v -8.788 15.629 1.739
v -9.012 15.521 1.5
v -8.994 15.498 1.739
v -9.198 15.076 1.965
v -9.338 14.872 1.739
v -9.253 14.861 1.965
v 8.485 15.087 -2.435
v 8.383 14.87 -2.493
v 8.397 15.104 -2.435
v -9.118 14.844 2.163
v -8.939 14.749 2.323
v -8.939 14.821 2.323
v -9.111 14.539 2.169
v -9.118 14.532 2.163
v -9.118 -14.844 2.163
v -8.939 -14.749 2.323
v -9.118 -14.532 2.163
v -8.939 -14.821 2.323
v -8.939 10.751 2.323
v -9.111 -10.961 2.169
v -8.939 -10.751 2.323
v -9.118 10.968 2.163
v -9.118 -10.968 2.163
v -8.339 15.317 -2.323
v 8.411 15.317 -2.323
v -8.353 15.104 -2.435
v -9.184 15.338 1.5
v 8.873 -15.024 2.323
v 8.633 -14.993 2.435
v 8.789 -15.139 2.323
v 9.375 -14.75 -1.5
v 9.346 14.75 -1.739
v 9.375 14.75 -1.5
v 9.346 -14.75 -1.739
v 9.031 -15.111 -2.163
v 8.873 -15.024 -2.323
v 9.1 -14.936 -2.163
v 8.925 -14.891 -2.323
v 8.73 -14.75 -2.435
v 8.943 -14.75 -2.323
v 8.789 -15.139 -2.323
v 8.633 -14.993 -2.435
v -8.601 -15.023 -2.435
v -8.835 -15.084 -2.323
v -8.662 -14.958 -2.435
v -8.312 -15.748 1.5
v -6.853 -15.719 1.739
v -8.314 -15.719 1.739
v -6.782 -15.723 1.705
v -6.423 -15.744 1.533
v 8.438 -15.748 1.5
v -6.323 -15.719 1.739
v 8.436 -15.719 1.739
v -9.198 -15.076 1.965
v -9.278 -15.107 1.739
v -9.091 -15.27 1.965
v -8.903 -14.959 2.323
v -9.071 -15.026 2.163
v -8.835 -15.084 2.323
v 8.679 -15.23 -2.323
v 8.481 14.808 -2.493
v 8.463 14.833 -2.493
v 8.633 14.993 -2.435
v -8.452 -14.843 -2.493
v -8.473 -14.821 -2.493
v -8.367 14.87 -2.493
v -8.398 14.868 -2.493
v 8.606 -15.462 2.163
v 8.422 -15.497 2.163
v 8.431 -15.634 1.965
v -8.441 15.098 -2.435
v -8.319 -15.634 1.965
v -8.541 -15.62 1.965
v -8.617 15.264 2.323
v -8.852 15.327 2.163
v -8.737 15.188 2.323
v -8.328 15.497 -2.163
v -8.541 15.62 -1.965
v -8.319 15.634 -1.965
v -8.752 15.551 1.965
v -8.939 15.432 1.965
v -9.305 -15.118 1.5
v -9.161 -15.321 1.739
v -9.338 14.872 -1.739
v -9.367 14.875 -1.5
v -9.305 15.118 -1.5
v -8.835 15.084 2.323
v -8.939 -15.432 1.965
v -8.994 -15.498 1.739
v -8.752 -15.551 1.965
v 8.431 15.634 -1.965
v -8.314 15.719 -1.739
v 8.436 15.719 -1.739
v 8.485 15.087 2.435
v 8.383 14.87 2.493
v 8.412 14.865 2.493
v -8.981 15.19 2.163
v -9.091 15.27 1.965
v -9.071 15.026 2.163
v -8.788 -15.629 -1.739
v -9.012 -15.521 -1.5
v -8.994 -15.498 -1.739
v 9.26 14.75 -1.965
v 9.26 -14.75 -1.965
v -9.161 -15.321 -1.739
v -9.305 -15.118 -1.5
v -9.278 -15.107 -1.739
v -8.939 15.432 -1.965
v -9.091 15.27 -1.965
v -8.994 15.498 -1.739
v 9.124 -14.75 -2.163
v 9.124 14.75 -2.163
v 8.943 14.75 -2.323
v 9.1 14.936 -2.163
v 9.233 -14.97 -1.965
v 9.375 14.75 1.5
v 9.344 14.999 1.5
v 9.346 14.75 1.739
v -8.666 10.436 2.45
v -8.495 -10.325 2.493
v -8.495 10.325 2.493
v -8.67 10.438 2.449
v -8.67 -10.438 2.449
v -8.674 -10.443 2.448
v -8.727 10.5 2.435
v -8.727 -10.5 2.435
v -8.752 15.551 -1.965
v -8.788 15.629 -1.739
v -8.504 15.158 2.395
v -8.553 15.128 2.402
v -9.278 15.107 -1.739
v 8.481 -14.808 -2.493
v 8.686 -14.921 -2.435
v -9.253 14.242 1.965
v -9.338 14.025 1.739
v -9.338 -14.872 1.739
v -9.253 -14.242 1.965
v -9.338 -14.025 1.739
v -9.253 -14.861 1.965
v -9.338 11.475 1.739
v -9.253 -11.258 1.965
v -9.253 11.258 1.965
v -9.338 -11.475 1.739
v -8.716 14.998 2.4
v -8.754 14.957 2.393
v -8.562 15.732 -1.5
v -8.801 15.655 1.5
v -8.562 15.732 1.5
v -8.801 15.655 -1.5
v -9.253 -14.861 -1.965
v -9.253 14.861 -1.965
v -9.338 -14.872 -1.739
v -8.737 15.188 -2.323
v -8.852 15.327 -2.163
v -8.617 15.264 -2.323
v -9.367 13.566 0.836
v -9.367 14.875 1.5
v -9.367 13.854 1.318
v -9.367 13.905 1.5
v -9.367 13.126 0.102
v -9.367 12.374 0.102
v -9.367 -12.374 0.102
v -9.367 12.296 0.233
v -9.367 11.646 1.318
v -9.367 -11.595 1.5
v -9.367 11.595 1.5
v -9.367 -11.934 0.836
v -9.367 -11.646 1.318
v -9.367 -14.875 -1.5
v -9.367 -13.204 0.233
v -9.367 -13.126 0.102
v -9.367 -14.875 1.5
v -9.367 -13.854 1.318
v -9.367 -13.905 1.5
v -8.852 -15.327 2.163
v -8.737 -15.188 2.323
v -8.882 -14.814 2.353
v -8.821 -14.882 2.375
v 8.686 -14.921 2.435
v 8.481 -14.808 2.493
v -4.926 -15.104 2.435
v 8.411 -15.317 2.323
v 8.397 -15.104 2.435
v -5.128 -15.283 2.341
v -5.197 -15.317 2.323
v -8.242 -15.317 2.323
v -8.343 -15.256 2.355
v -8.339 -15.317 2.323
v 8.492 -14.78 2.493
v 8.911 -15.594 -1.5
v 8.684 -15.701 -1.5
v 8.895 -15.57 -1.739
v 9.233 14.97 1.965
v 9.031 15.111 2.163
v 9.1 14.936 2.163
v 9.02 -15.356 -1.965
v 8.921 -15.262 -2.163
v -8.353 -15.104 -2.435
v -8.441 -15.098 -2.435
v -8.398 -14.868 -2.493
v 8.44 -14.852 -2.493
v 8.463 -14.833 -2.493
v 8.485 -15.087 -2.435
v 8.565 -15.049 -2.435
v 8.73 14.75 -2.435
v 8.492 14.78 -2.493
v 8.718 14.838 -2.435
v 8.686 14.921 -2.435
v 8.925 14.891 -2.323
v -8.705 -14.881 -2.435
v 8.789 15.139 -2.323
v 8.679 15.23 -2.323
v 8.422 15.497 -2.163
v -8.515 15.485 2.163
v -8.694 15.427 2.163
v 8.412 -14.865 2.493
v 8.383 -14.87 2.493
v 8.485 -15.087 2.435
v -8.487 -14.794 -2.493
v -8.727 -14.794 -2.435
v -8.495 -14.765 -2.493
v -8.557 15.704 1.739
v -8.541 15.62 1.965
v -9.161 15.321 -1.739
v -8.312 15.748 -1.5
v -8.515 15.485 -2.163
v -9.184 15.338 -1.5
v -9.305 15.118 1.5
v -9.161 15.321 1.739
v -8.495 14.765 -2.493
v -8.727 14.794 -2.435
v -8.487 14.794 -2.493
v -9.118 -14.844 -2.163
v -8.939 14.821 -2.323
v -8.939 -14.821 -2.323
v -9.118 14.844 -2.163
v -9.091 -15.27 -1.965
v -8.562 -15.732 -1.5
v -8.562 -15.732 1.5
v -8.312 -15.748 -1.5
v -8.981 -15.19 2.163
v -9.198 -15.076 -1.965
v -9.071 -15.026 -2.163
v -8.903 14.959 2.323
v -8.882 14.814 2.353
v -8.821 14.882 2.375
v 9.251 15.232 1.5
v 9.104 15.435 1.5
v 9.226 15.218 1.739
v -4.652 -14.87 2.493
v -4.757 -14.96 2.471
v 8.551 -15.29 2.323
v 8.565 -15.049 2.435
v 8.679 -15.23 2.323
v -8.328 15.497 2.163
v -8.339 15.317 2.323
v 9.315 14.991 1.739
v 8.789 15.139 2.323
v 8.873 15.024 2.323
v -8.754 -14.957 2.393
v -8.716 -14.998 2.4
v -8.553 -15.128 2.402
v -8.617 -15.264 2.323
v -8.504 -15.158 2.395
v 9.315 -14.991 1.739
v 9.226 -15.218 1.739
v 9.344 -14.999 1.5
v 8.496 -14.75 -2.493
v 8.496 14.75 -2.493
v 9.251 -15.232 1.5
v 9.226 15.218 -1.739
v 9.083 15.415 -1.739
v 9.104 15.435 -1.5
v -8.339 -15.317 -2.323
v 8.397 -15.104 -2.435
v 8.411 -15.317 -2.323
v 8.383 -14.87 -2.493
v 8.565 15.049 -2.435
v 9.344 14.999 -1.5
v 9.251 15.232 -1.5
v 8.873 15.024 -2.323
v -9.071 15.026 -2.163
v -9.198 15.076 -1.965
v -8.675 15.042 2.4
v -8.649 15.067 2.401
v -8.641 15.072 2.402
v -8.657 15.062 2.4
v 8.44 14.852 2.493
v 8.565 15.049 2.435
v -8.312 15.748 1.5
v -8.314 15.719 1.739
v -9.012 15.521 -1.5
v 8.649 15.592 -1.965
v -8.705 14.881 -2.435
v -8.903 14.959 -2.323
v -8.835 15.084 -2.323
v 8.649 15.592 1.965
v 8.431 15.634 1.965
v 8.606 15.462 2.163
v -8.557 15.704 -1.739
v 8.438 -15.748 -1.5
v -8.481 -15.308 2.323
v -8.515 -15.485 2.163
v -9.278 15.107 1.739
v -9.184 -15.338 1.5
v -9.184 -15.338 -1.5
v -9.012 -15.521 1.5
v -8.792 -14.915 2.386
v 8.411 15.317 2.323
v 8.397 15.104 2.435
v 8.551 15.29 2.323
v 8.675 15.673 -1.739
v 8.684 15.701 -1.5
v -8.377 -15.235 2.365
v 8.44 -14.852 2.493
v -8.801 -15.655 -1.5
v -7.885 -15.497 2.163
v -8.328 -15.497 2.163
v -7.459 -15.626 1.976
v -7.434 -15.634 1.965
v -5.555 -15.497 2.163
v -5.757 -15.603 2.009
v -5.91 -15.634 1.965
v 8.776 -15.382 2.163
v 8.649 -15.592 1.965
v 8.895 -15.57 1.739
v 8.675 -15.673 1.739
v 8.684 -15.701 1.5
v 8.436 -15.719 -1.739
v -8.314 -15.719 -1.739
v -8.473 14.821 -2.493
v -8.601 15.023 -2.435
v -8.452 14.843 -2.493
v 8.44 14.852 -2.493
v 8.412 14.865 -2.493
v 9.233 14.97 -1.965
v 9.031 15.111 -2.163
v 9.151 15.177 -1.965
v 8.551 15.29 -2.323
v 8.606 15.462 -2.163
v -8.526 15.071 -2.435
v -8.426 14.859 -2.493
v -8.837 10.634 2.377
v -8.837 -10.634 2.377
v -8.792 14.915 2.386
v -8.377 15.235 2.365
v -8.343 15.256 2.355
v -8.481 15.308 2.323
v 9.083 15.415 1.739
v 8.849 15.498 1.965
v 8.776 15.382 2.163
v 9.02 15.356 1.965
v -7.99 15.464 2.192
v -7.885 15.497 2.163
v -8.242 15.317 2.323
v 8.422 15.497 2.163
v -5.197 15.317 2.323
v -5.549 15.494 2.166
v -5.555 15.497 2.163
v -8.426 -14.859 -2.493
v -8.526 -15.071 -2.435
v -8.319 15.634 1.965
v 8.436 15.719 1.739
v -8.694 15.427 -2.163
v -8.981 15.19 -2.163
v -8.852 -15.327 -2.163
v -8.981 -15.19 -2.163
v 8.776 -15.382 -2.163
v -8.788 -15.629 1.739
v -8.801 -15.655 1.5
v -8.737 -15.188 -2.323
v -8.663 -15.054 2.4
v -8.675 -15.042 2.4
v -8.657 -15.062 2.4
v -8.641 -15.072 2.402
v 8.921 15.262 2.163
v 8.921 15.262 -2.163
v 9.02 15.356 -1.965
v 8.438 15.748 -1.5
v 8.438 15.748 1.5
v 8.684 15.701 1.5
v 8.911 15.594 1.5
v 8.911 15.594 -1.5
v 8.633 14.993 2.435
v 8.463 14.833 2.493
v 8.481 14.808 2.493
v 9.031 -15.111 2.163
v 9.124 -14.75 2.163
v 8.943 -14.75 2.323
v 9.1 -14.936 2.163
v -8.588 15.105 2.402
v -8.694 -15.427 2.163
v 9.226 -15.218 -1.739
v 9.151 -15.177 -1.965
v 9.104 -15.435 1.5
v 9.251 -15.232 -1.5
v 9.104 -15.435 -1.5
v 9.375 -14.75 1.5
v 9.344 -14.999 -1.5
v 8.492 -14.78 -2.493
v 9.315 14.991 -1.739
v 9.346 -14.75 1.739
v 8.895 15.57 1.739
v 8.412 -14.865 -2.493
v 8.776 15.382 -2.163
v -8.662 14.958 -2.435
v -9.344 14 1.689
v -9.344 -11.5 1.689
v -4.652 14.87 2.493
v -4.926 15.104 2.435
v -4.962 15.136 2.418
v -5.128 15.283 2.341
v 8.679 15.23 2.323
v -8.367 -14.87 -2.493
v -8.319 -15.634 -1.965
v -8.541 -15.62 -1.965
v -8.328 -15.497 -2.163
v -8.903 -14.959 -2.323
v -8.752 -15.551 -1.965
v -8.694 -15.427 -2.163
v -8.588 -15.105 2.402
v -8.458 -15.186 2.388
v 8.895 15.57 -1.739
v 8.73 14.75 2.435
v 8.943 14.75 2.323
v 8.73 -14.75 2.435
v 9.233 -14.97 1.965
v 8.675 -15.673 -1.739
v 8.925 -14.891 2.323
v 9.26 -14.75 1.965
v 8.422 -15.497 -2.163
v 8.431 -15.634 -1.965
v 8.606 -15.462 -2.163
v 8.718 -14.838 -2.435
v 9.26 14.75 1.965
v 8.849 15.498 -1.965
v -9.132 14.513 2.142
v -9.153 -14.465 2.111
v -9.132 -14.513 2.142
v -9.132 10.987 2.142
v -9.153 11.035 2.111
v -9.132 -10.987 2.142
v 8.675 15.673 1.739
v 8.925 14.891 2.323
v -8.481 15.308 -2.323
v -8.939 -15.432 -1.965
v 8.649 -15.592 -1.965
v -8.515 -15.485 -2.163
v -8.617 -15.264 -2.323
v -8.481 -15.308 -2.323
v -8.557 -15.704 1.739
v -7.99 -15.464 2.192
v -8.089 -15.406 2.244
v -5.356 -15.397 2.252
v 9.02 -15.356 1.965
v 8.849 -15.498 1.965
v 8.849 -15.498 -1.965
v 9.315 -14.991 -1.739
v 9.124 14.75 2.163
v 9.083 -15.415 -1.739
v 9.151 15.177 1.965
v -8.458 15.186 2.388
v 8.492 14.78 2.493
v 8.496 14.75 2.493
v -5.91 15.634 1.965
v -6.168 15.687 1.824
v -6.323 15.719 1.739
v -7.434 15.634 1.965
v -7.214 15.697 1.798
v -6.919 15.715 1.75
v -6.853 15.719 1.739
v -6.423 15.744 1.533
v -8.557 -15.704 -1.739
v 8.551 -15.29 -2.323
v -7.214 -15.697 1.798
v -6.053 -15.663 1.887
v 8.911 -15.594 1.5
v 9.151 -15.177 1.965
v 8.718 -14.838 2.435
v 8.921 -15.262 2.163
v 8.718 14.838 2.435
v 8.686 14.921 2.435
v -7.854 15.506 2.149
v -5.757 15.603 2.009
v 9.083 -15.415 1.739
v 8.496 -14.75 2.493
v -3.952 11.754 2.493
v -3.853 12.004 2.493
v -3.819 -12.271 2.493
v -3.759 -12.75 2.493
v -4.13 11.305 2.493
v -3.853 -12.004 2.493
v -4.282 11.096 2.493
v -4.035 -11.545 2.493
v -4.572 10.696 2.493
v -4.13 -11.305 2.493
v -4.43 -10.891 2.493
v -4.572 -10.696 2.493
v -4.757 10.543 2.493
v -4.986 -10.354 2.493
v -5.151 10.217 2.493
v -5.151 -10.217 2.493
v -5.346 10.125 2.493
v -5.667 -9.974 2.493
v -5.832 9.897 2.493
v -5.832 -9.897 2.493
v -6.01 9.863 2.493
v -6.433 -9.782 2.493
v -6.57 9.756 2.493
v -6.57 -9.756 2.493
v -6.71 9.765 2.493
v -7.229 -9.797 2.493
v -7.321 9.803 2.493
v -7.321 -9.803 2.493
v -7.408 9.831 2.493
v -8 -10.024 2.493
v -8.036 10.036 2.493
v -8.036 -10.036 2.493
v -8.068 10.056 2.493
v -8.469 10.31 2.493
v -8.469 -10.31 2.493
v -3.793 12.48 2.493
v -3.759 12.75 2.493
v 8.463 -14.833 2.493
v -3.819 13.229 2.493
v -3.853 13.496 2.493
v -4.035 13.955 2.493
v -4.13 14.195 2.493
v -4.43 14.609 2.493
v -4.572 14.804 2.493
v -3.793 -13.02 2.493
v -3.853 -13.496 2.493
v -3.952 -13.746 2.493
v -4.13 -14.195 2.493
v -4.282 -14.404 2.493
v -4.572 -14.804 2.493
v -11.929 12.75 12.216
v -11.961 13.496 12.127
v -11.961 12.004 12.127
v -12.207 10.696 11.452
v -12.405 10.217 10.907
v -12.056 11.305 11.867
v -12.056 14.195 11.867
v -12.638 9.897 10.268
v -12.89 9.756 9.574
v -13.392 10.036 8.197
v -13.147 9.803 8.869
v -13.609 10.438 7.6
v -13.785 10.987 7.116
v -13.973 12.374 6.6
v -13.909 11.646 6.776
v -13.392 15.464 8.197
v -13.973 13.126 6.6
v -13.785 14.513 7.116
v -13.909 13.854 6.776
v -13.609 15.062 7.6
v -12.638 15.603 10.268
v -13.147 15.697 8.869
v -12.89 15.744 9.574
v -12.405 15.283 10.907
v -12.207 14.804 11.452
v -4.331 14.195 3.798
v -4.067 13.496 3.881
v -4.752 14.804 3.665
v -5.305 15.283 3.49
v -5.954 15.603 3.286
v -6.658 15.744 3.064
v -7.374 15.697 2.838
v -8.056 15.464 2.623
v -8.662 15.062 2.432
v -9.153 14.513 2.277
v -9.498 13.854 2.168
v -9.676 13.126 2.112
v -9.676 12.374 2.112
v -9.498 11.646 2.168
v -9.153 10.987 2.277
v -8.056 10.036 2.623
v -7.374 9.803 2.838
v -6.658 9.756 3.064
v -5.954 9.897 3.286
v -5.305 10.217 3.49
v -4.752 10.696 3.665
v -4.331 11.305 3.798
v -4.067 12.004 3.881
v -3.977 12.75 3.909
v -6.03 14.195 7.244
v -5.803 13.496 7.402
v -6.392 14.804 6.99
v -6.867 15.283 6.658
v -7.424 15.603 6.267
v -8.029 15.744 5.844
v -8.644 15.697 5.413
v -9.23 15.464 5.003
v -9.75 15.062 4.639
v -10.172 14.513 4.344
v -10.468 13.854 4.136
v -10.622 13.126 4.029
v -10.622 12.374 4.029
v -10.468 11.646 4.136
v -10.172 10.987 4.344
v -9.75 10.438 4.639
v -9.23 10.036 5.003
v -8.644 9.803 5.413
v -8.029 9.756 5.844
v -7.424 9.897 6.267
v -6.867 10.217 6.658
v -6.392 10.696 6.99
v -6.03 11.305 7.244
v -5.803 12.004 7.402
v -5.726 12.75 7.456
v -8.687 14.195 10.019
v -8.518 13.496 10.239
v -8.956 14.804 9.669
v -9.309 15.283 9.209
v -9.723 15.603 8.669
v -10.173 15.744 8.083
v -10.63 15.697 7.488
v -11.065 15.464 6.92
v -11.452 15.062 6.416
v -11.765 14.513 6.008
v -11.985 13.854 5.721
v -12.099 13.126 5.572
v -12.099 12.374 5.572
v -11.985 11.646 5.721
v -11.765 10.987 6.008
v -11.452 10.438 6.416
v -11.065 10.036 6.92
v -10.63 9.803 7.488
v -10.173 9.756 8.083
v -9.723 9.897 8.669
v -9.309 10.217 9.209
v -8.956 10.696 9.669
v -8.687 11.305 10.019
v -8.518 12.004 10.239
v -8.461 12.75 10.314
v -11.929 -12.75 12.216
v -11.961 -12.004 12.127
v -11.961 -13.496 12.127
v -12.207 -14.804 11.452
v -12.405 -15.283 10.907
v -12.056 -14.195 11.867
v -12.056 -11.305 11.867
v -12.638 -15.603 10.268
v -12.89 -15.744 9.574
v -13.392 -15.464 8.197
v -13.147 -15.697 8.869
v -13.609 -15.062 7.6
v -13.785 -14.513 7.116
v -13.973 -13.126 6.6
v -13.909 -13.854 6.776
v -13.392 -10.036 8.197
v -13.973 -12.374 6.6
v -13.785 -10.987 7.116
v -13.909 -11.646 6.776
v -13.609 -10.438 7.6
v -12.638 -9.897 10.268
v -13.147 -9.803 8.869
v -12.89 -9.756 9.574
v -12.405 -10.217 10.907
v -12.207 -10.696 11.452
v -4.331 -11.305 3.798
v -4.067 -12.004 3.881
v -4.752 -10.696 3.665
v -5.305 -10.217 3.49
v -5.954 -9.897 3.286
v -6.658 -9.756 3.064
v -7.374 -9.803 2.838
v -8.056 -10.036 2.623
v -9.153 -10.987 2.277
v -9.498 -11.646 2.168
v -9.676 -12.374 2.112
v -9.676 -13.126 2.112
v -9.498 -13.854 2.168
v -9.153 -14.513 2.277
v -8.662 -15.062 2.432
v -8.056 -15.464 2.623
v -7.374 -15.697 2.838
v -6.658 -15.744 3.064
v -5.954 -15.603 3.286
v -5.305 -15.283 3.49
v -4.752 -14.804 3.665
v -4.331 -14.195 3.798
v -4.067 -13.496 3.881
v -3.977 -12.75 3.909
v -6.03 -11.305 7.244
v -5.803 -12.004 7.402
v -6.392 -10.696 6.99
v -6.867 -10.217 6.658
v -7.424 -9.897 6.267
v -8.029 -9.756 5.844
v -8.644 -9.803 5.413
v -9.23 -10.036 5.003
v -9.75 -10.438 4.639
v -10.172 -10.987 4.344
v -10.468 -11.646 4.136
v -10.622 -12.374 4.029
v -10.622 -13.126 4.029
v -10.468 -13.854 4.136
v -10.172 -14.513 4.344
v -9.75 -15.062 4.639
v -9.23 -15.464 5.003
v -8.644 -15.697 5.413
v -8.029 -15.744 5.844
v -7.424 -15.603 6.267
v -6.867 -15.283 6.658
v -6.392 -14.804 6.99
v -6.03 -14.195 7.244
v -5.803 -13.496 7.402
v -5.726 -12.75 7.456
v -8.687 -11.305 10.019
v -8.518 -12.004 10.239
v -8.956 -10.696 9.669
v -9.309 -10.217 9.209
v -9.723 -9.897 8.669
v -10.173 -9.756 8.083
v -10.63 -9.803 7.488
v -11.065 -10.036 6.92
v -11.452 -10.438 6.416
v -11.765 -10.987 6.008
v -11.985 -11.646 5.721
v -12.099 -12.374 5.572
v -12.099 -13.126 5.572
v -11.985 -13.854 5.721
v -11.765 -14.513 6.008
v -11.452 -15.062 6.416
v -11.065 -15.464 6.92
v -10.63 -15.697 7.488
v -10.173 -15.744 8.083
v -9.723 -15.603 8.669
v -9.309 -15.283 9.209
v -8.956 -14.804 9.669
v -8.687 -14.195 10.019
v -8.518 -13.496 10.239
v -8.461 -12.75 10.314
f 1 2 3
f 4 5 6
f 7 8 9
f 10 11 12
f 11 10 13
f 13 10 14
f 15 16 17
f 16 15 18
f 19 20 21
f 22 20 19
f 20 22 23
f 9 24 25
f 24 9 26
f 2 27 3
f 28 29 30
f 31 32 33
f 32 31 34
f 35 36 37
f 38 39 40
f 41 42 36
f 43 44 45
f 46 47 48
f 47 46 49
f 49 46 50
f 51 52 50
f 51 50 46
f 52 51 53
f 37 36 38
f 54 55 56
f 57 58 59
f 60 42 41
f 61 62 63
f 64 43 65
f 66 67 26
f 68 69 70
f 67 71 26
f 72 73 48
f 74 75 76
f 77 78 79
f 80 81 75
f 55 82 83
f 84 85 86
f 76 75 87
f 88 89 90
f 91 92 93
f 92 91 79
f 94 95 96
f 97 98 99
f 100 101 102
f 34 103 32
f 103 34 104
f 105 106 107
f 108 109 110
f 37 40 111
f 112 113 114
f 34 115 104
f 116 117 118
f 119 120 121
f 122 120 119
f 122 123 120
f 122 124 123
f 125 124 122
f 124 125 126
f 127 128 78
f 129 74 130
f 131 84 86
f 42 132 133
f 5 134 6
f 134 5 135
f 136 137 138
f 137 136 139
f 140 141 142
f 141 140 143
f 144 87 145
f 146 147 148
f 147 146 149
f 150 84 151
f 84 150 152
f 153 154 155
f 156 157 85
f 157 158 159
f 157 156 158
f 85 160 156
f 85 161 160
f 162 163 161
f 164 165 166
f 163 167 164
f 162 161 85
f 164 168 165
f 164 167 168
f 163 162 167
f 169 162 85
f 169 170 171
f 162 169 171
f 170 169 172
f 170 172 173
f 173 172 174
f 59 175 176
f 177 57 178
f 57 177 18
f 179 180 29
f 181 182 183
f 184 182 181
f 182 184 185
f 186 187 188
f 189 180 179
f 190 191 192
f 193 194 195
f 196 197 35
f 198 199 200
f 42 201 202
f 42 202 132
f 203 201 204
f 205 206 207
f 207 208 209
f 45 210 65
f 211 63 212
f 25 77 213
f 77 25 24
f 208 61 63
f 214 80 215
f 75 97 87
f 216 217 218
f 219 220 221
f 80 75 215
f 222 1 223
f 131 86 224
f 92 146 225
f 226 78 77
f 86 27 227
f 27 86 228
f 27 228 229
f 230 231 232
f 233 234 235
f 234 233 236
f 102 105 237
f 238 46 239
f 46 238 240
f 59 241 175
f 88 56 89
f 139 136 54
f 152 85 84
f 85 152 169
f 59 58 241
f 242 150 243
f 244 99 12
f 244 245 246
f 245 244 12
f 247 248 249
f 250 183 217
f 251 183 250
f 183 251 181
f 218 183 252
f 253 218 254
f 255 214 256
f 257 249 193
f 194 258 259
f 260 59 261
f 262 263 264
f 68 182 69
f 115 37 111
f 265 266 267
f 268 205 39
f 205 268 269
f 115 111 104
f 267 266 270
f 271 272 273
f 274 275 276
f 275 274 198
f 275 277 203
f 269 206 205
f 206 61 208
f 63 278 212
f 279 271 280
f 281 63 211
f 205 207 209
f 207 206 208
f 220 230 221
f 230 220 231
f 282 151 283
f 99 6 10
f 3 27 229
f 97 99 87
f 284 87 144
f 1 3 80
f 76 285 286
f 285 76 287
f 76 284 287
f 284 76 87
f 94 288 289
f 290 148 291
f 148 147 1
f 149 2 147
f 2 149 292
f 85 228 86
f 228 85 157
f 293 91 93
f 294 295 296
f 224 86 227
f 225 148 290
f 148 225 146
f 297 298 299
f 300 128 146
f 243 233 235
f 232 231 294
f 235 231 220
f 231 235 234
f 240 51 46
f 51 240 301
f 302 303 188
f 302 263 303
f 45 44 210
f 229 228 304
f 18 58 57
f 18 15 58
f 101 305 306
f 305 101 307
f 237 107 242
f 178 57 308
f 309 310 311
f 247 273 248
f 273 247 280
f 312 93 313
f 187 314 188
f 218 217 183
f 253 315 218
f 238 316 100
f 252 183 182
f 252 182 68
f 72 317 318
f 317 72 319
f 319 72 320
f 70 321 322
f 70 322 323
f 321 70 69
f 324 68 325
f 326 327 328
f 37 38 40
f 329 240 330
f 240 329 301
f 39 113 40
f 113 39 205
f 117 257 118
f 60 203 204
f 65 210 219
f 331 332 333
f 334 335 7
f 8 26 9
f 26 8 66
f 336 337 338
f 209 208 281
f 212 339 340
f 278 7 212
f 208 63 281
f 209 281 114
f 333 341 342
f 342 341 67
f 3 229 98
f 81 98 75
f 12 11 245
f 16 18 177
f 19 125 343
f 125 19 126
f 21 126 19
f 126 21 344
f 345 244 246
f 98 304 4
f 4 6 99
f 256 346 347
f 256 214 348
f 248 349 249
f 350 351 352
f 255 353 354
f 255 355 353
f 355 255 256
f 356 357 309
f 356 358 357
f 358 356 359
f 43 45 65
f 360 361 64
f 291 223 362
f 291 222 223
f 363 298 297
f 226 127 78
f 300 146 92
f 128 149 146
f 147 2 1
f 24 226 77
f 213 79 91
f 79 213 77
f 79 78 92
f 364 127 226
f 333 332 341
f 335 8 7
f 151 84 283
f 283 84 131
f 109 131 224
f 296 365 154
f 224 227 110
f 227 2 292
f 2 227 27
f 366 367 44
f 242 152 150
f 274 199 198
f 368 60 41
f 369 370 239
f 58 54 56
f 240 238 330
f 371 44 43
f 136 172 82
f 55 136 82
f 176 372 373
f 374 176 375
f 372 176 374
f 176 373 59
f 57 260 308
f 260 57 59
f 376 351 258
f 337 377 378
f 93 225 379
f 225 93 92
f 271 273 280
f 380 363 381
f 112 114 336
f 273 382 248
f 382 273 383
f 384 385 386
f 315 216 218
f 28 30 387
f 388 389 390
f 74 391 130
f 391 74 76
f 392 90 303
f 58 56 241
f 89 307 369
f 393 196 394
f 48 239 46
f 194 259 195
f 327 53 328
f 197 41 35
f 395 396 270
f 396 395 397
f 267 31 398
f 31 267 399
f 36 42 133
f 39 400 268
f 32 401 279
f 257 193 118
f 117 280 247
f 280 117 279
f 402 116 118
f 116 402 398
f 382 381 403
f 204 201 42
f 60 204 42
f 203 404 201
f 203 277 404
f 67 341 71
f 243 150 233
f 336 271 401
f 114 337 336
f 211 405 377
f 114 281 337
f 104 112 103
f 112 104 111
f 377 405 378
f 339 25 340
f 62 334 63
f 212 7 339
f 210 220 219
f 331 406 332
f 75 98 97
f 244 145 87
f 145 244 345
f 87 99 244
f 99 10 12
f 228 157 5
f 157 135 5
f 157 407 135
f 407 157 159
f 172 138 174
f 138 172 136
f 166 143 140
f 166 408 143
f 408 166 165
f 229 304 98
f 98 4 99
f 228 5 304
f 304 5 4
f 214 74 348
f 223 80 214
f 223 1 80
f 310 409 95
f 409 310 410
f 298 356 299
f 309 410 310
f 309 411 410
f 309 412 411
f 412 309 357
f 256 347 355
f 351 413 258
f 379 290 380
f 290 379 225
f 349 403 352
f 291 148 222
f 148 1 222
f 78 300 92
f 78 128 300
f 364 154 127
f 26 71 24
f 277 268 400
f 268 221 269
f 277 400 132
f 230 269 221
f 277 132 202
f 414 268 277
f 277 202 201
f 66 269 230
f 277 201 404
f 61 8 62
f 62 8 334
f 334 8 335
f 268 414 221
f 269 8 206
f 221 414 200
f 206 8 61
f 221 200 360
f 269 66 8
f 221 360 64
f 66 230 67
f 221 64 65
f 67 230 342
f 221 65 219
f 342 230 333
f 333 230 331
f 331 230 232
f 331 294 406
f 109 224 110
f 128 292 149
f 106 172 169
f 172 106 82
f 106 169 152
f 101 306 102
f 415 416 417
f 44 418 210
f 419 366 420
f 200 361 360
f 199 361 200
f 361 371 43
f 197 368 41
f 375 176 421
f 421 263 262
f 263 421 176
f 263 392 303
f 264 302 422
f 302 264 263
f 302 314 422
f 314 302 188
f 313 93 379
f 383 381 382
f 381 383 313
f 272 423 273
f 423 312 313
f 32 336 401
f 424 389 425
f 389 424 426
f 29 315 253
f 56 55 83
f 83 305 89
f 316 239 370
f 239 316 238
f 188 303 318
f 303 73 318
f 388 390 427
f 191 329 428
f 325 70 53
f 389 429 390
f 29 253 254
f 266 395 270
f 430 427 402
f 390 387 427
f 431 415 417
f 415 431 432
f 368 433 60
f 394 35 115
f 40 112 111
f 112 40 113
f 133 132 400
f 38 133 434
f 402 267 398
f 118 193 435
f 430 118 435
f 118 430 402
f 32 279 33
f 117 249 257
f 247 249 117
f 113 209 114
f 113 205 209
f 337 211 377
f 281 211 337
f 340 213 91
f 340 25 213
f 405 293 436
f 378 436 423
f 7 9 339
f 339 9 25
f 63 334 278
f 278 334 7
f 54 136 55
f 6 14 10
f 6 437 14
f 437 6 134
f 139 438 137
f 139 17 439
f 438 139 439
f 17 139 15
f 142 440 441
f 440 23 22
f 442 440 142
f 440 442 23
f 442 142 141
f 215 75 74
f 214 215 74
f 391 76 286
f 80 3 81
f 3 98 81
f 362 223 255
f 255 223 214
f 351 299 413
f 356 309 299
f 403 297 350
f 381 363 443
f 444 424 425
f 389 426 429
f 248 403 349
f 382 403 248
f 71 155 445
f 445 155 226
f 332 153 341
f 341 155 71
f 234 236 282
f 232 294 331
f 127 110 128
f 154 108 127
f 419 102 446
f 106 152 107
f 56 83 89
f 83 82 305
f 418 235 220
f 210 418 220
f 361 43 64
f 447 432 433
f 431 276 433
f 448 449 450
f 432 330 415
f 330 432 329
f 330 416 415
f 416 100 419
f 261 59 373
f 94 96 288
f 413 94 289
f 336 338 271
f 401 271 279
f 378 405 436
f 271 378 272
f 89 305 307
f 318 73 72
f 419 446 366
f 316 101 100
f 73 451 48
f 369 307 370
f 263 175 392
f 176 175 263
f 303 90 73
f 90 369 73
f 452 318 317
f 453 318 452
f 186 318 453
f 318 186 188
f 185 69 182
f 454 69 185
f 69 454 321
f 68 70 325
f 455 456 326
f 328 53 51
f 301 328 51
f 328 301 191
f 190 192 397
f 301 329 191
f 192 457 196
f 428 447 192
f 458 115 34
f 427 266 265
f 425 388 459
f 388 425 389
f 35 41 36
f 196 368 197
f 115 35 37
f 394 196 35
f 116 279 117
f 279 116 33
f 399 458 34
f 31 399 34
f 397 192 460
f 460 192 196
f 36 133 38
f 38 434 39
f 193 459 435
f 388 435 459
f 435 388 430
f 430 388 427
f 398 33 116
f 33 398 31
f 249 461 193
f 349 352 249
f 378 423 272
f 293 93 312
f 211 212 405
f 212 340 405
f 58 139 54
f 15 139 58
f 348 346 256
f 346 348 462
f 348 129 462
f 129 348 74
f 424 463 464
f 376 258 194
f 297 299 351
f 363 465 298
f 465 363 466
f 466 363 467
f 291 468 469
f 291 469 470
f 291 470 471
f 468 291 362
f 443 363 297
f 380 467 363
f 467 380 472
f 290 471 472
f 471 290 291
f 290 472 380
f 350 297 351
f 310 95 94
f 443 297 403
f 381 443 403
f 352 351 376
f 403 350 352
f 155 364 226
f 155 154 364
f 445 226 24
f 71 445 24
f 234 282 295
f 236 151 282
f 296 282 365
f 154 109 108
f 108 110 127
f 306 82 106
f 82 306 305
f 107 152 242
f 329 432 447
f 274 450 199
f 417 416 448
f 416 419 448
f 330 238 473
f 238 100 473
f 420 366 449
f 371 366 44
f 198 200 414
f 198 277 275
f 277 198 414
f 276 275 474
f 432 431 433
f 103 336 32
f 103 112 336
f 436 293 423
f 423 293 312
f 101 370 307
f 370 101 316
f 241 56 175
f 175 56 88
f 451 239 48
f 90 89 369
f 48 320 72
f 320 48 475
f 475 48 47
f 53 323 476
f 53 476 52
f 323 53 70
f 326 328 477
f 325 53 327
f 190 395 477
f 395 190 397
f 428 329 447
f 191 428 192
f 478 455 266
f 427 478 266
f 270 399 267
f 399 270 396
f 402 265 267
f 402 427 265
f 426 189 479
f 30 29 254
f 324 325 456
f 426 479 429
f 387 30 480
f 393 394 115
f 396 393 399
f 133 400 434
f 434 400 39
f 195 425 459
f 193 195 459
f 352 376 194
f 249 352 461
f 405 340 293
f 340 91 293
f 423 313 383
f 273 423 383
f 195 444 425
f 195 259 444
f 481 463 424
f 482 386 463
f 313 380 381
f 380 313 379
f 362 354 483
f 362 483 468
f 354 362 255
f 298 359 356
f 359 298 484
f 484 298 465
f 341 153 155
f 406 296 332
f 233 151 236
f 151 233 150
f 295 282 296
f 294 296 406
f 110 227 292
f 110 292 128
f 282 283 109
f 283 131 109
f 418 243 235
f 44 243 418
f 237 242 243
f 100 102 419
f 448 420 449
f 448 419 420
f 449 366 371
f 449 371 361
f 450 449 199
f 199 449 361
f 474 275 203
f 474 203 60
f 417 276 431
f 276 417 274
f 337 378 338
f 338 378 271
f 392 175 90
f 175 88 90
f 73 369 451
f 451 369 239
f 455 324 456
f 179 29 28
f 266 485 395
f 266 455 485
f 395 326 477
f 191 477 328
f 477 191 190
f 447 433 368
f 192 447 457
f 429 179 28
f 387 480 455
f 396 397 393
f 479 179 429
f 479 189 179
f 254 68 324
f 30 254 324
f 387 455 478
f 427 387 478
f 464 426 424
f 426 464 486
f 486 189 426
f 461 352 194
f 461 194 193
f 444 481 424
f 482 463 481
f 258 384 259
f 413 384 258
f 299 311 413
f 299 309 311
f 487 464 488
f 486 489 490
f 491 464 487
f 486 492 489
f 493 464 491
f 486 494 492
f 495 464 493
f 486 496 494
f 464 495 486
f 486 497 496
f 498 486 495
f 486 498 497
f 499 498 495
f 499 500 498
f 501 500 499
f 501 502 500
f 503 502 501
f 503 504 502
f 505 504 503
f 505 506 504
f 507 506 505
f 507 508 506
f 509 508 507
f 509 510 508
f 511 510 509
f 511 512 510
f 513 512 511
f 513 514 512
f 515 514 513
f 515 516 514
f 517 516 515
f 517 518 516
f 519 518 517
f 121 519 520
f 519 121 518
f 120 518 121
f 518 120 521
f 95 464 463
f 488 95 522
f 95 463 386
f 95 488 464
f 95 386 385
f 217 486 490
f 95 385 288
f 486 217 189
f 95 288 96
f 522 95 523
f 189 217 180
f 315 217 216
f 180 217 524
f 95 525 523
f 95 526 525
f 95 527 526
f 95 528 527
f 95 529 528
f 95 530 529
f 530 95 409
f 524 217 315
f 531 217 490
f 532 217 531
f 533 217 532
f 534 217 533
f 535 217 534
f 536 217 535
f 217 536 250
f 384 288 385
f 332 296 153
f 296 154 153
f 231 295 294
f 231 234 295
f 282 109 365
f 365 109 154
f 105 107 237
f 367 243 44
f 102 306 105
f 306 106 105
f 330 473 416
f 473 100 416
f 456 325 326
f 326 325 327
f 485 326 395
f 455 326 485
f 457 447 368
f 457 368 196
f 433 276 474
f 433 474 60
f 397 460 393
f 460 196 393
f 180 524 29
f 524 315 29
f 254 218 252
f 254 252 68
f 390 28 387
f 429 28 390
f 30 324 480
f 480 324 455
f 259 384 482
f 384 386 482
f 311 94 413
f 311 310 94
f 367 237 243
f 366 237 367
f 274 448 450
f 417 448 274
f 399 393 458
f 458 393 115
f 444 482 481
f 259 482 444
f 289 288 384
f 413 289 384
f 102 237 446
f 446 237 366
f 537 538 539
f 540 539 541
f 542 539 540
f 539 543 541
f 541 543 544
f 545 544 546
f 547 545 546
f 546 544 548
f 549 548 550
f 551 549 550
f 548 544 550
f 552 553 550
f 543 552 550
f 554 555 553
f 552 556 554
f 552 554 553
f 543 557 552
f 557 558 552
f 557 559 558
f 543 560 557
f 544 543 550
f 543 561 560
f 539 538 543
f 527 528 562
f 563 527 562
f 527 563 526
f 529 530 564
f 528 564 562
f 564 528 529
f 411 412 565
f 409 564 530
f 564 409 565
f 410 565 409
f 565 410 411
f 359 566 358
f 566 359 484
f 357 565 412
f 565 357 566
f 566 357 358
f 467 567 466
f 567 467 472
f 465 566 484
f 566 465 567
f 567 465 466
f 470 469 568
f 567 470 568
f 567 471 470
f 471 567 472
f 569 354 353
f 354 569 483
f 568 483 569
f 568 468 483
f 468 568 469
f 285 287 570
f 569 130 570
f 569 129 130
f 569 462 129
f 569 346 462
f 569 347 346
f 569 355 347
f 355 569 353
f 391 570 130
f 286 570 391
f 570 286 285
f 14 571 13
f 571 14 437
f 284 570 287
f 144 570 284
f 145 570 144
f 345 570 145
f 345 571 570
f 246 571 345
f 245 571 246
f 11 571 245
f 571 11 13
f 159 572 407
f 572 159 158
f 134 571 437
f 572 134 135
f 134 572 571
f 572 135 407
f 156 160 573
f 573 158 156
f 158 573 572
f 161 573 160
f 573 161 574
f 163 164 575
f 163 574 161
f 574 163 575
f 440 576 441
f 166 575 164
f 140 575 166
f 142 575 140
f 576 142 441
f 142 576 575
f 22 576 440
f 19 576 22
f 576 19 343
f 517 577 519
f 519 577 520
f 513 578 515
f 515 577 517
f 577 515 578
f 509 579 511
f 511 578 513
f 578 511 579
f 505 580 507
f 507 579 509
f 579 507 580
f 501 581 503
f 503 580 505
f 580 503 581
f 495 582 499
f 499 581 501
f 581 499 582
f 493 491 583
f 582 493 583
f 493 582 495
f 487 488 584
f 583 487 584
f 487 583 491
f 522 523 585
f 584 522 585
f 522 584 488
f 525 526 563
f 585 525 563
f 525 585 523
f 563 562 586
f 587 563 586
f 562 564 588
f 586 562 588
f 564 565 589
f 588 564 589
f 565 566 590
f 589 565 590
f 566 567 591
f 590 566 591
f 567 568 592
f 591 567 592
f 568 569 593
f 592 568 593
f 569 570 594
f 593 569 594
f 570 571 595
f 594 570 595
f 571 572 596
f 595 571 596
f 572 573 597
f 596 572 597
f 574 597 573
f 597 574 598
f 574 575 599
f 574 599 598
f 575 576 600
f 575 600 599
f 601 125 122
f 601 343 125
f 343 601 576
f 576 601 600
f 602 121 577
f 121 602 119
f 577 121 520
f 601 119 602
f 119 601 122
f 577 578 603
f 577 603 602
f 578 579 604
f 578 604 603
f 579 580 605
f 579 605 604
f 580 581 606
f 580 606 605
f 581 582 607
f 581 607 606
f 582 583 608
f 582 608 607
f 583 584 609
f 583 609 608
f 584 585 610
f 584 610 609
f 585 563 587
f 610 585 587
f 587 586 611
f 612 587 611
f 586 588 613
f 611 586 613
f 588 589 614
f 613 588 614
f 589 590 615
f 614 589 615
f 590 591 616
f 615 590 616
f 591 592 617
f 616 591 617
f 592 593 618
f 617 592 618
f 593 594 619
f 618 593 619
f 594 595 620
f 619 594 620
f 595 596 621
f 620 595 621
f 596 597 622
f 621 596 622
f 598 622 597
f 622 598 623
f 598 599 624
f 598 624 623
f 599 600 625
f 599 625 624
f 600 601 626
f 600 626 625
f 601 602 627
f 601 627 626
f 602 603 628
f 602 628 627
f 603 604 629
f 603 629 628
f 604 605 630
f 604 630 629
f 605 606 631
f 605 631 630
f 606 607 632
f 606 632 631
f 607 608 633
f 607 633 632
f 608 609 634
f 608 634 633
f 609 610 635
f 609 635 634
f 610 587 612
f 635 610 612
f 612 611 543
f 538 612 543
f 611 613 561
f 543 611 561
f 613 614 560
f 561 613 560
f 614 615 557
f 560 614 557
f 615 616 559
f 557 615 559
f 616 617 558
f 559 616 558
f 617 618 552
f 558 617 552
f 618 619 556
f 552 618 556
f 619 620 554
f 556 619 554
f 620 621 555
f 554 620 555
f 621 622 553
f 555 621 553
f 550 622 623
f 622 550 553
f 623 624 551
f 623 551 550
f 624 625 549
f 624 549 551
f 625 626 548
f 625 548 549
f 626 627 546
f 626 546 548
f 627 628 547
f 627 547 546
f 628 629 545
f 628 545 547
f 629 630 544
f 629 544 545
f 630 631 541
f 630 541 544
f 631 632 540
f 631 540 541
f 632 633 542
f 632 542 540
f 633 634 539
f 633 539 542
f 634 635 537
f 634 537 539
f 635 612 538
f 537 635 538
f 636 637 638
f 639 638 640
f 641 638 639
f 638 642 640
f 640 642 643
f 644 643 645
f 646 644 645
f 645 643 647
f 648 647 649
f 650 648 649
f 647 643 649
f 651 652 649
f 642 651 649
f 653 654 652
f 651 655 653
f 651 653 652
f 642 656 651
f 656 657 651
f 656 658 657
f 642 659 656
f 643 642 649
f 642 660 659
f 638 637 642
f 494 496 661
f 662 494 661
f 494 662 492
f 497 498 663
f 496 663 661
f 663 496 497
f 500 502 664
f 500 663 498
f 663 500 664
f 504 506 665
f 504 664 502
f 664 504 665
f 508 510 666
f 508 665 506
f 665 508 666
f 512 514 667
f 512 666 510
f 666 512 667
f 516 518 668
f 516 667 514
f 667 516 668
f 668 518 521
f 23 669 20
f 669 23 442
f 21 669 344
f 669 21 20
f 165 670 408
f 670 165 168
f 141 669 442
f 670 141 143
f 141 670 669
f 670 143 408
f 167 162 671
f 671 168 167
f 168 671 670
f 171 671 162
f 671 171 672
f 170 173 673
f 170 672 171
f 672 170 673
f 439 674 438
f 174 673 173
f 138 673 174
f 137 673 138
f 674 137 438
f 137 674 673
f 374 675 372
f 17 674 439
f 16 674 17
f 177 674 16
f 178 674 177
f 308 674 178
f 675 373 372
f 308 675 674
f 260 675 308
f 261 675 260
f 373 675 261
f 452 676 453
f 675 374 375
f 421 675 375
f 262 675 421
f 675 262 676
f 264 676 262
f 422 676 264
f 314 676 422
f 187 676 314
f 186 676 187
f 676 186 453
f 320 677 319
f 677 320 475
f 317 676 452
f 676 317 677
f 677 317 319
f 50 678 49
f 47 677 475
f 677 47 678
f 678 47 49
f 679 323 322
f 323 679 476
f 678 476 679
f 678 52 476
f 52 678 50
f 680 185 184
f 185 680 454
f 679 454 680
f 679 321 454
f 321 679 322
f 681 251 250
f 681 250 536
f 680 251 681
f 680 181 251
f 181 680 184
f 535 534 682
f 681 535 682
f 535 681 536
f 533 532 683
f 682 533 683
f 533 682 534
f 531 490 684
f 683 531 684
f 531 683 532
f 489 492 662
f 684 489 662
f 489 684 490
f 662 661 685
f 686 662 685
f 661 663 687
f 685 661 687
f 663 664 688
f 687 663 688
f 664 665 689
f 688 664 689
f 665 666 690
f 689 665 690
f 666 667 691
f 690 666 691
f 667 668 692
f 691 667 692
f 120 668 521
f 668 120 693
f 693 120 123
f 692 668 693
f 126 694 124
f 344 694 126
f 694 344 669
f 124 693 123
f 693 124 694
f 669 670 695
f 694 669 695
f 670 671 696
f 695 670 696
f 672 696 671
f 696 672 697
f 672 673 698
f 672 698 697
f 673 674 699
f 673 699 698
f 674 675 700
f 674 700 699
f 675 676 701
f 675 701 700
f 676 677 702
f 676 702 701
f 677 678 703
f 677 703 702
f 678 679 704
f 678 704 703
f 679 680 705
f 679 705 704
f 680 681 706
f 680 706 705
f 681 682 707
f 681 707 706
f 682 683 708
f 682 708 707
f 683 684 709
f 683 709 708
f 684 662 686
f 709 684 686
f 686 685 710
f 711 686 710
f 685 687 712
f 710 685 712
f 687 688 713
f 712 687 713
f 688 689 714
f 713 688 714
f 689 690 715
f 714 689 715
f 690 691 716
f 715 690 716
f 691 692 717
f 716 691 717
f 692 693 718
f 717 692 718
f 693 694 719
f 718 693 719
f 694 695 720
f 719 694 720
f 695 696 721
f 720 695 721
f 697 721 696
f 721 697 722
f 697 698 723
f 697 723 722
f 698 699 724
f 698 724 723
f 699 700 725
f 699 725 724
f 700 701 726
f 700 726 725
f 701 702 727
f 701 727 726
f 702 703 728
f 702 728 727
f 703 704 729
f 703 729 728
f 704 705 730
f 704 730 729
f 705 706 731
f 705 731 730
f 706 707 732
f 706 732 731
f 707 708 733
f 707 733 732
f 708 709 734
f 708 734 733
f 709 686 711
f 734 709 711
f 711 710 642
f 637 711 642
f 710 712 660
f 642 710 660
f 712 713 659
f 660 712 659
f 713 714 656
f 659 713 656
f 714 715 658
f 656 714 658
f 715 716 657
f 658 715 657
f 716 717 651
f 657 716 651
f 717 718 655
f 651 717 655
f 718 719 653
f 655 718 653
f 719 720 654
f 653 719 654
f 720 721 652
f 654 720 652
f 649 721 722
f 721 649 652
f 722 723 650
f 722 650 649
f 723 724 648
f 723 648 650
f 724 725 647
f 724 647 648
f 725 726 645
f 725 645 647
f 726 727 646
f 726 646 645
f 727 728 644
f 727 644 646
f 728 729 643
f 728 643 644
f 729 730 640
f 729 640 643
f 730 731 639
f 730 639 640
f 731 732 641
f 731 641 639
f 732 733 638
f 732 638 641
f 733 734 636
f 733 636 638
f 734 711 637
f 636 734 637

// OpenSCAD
$fn = 25;

roundcorner = 2; 

horn_arc = 70;

color("blue") minkowski() {
    cube([(25.5 / 2) - roundcorner + 6, 25.5 - roundcorner + 6, 5 - roundcorner], center = true);
    sphere(d = roundcorner);
}

// translate([1, 1, 1])  cube([15.5, 25.5, 9], center = true);

translate([(-25.5 / 4) - 10, 12.75, 0]) {
    rotate([90, 0, 0]) {
        color("red") rotate_extrude(angle=horn_arc) {
            translate([10, 0]) {
                circle(d=6);
            }
        }
    }
}


translate([(-25.5 / 4) - 10, -12.75, 0]) {
    rotate([90, 0, 0]) {
        color("red") rotate_extrude(angle=horn_arc) {
            translate([10, 0]) {
                circle(d=6);
            }
        }
    }
}
